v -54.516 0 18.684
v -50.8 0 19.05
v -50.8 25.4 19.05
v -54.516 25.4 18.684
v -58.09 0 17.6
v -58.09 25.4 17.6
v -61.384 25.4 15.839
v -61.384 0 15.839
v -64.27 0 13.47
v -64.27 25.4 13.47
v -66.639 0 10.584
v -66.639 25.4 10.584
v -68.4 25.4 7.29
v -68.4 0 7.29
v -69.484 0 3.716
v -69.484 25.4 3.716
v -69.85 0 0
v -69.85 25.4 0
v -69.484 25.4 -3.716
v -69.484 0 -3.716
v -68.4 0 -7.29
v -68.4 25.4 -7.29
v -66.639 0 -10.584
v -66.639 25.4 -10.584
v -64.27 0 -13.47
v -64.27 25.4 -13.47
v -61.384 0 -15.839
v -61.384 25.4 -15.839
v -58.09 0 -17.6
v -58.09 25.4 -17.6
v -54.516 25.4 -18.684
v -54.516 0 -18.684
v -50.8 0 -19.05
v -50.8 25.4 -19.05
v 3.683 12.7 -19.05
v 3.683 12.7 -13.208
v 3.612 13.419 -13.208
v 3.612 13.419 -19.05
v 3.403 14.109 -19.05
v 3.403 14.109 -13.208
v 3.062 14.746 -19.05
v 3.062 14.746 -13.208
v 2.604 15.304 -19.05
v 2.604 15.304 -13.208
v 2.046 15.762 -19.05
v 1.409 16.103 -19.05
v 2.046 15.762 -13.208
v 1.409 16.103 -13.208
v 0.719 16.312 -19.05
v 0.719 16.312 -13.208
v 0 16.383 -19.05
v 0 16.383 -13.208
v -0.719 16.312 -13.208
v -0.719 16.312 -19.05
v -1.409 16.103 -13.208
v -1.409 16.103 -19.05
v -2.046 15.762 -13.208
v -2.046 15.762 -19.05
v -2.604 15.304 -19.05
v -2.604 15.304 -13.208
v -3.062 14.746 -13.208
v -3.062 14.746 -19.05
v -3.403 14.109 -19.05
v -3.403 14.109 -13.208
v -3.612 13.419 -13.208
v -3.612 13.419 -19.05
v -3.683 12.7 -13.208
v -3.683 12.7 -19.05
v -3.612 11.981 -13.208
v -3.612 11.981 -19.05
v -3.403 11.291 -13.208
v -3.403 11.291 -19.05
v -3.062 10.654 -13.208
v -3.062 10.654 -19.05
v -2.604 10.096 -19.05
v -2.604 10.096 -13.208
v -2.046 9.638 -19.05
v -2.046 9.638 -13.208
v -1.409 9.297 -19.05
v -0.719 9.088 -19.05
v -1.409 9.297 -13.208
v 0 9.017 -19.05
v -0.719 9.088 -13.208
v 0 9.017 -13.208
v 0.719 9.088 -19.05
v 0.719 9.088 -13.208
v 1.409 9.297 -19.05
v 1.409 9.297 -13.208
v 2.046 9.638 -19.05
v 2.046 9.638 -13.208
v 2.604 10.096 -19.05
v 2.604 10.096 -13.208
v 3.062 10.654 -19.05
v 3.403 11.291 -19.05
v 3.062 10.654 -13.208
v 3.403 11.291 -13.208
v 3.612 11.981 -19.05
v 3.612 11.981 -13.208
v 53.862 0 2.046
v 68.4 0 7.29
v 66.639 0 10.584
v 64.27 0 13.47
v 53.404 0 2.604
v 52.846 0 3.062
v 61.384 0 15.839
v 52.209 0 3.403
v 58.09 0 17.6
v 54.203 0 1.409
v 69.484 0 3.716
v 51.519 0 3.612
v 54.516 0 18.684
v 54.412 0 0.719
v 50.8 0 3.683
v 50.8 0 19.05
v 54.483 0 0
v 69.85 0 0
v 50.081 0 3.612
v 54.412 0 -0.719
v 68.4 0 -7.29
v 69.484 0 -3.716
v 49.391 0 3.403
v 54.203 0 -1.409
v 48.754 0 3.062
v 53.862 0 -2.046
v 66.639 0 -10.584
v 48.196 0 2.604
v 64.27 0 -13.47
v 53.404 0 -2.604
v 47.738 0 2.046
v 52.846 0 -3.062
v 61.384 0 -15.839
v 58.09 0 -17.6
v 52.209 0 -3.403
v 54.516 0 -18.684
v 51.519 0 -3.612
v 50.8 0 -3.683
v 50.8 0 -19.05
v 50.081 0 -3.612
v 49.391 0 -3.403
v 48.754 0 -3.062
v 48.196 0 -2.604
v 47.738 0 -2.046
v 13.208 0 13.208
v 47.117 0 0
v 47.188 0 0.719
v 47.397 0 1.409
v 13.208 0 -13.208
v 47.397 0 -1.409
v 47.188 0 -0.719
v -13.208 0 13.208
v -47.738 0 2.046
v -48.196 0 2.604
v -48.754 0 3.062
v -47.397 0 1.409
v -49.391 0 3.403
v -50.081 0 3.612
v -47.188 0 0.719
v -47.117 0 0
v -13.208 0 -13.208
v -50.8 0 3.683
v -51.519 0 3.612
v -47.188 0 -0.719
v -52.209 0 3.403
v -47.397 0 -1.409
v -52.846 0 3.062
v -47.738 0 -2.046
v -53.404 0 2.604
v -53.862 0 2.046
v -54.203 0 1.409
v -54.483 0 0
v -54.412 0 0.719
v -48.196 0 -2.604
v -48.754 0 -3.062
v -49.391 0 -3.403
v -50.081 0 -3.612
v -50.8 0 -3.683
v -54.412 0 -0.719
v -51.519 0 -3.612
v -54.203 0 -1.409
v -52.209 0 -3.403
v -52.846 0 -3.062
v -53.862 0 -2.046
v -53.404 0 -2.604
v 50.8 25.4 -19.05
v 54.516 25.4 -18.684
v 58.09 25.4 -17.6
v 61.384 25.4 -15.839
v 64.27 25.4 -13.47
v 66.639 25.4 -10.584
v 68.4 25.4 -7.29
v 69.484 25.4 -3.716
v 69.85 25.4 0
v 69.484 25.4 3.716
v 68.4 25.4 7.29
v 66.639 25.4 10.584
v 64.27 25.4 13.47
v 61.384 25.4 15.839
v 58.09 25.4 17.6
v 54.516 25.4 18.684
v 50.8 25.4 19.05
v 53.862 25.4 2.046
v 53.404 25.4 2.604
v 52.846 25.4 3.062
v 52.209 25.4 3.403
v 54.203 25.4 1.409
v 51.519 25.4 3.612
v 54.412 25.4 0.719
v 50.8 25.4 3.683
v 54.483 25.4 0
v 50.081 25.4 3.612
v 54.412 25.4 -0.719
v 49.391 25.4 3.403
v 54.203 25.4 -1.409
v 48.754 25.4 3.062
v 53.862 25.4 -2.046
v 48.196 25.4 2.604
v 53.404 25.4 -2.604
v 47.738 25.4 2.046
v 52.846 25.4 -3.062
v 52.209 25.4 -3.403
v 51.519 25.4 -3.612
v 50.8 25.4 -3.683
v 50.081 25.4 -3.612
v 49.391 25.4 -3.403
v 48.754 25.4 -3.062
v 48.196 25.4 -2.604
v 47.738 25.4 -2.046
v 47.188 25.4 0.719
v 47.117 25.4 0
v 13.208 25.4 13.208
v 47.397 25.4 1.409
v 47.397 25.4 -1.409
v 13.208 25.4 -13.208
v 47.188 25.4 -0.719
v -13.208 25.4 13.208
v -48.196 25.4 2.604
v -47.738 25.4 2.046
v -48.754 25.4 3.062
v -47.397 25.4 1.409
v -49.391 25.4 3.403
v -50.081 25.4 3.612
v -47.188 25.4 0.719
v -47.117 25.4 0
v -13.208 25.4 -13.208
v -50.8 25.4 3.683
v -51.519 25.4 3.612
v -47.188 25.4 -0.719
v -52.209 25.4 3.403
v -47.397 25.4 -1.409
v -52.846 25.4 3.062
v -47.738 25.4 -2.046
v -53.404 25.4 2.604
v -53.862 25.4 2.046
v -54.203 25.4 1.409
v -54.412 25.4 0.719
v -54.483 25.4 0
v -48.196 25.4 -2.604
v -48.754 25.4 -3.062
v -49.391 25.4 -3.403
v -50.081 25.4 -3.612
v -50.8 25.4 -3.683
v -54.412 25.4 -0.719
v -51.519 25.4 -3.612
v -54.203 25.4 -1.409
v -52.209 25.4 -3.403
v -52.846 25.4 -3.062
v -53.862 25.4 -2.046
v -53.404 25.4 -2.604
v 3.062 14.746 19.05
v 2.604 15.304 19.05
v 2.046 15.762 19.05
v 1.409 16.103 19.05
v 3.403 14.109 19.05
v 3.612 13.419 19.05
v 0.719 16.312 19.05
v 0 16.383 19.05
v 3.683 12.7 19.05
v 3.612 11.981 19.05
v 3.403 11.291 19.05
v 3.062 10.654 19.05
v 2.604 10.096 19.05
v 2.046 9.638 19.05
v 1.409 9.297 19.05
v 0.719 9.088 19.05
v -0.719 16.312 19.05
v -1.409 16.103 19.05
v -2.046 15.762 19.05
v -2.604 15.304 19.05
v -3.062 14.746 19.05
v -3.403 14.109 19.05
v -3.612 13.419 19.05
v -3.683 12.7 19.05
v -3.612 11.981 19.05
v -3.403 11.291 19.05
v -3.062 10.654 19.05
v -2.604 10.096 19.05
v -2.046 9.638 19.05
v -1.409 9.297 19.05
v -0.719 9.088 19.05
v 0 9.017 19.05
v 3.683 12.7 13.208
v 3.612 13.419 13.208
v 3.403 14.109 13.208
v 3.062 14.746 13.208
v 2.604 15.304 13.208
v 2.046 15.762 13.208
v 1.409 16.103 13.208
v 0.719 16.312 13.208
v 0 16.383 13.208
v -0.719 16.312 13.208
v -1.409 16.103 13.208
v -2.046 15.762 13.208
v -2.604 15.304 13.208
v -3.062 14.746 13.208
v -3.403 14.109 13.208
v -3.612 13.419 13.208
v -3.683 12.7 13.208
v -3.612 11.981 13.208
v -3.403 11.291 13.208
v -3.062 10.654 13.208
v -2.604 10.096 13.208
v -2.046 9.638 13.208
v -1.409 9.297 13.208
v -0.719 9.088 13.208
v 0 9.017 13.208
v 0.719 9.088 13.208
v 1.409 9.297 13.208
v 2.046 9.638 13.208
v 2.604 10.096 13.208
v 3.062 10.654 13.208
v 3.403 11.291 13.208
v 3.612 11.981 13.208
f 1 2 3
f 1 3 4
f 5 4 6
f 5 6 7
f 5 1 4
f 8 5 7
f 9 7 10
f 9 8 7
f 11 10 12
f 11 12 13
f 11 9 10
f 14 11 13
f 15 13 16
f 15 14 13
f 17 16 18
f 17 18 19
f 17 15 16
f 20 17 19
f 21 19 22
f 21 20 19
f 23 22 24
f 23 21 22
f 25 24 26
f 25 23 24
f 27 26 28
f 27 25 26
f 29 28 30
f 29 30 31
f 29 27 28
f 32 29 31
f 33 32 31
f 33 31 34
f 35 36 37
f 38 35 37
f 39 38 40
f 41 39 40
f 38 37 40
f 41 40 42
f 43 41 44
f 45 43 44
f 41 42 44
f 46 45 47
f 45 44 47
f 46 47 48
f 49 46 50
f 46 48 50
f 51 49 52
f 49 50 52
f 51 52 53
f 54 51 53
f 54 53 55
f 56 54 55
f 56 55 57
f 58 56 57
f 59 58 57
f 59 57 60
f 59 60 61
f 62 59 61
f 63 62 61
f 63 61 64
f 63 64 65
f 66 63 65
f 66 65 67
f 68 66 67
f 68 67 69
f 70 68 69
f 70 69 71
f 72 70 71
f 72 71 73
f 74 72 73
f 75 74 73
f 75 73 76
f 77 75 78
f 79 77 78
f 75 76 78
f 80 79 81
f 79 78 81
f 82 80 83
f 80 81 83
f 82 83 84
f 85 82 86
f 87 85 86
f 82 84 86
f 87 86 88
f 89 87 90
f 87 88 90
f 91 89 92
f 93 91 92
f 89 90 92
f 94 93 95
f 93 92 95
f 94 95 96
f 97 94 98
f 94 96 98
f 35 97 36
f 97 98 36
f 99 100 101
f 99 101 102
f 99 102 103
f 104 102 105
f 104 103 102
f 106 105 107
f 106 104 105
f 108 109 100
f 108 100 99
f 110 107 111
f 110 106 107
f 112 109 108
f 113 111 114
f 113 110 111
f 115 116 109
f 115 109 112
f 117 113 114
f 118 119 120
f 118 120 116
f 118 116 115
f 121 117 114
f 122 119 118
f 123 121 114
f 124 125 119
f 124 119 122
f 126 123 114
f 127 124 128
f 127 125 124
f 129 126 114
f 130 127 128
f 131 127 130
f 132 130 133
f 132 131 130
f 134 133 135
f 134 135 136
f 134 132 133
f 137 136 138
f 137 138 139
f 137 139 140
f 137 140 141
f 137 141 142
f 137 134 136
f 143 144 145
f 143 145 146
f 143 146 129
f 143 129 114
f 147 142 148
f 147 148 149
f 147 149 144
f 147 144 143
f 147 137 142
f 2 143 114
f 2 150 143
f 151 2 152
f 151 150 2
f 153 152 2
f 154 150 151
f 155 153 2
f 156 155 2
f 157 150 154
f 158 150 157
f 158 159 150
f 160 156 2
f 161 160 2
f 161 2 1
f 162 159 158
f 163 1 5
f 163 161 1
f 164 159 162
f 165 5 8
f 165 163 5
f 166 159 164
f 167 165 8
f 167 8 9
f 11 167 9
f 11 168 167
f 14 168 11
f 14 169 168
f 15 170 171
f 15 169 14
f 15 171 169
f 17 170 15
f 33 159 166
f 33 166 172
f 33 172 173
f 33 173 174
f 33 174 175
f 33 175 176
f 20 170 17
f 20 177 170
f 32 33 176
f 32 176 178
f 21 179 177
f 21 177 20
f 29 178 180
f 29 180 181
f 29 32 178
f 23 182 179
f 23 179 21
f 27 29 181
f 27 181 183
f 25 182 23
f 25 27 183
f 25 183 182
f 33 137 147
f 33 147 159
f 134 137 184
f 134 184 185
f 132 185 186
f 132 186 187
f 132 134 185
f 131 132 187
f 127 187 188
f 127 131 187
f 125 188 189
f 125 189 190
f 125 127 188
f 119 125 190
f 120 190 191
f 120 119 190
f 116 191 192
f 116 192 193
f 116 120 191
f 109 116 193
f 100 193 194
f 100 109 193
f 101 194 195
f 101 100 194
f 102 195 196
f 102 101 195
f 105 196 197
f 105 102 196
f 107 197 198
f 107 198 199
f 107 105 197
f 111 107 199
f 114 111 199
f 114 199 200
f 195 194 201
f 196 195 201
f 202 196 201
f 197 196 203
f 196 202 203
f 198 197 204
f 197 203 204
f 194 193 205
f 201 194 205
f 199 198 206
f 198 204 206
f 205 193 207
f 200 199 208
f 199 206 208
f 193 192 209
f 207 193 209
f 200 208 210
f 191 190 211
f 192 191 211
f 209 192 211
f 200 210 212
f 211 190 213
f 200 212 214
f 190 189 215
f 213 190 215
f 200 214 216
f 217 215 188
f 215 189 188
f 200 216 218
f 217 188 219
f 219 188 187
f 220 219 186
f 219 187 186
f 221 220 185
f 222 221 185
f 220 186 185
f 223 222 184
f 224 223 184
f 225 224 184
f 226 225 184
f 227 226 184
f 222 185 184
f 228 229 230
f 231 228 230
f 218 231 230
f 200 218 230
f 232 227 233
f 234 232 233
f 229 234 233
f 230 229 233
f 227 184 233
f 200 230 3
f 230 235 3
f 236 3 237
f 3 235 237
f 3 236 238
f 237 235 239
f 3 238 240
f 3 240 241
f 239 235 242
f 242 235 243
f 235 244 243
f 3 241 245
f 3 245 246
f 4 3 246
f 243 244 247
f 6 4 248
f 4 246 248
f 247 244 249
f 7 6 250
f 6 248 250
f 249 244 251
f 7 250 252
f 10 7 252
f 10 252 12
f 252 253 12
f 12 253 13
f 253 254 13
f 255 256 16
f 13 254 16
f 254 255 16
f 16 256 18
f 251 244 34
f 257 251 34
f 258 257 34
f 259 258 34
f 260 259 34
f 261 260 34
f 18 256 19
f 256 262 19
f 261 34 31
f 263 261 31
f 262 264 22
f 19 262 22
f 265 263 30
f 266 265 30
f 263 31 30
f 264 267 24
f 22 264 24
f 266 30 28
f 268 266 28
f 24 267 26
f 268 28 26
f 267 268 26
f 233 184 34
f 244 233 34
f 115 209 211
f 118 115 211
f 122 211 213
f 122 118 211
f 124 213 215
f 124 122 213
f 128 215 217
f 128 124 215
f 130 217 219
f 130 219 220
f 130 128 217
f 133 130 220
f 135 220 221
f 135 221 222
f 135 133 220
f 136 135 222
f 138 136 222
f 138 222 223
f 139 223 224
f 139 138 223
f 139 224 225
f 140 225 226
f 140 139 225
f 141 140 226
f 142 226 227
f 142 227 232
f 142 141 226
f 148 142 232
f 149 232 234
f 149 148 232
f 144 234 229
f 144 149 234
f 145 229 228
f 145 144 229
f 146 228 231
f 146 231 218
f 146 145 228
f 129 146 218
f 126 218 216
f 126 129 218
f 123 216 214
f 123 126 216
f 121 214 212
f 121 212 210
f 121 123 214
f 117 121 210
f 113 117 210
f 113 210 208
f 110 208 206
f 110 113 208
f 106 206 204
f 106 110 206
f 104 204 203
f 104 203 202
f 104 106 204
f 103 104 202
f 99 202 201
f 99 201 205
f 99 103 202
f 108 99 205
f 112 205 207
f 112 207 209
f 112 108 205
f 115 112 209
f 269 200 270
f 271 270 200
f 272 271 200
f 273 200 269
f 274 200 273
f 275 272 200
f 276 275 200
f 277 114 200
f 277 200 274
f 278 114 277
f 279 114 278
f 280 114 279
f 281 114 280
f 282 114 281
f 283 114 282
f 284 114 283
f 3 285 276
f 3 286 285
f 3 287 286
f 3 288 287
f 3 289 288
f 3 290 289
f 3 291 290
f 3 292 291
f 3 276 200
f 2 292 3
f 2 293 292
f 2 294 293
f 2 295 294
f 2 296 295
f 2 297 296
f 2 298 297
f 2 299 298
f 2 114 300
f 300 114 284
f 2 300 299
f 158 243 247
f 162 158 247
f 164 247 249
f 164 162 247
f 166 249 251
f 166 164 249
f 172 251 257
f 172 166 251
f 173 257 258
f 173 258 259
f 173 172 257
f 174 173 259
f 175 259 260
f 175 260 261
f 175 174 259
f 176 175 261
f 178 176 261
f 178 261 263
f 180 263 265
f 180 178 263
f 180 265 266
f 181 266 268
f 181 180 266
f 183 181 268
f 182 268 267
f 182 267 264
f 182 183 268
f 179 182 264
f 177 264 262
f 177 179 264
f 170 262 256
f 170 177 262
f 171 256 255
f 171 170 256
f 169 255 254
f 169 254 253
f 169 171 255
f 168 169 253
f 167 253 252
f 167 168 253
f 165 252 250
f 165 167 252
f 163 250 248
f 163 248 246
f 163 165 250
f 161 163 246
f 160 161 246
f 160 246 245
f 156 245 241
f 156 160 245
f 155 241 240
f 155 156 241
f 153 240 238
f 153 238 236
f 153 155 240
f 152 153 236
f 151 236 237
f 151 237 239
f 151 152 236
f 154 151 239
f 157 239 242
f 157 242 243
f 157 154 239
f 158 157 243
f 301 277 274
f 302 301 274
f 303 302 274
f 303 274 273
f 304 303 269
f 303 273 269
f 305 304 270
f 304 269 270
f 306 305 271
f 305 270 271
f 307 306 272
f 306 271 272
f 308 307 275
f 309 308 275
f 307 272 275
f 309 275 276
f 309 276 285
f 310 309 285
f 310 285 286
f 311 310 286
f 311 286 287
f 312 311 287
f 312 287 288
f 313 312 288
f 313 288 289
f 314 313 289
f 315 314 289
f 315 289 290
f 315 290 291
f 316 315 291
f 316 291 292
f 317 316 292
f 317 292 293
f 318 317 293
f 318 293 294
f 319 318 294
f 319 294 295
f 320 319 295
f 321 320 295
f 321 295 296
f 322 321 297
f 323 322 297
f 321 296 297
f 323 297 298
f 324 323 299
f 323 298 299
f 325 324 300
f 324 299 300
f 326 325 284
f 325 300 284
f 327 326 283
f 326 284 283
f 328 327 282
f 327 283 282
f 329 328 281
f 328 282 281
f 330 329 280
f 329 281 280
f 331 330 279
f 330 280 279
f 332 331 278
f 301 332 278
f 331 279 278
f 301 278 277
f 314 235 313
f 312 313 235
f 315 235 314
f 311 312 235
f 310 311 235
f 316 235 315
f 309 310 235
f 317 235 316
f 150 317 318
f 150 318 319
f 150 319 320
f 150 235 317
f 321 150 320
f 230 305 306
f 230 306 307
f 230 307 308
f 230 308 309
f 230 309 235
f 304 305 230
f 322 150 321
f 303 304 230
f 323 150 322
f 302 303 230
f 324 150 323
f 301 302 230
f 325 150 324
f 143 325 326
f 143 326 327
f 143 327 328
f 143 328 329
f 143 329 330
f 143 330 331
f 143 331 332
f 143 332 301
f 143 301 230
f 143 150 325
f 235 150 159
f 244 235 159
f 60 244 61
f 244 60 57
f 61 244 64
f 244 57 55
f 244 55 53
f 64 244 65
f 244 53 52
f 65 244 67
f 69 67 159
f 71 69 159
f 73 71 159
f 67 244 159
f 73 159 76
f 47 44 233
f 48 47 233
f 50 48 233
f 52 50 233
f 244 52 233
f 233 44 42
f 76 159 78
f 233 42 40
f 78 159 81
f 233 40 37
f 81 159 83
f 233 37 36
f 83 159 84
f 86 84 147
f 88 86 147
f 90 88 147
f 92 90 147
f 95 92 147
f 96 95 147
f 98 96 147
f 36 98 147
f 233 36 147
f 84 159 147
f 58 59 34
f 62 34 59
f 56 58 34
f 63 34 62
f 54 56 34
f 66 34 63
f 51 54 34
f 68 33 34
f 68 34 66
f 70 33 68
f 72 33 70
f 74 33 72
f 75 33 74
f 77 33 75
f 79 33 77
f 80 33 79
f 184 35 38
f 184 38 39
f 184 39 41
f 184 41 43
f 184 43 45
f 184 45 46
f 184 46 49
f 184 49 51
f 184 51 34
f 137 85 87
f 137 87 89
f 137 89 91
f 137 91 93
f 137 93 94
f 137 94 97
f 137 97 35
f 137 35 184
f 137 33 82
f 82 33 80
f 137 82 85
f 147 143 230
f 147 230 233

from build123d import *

# Parameters (mm, degrees)
SKETCH1_R           = 3.683
SKETCH1_W           = 26.416
SKETCH1_H           = 26.416
BOSS_EXTRUDE1_DEPTH = 25.4
SKETCH2_R           = 3.683
CUT_EXTRUDE1_DEPTH  = 39.1


with BuildPart() as part:
    # Sketch1 → Boss-Extrude1 (new body)
    with BuildSketch(Plane(origin=(0, 0, 0), x_dir=(1, 0, 0), z_dir=(0, 1, 0))):
        with BuildLine():
            Line((-50.8, 19.05), (50.8, 19.05))
            ThreePointArc((50.8, 19.05), (69.85, 0), (50.8, -19.05))
            Line((50.8, -19.05), (-50.8, -19.05))
            ThreePointArc((-50.8, -19.05), (-69.85, 0), (-50.8, 19.05))
        make_face()
        with Locations((-50.8, 0)):
            Circle(SKETCH1_R, mode=Mode.SUBTRACT)
        with Locations((50.8, 0)):
            Circle(SKETCH1_R, mode=Mode.SUBTRACT)
        Rectangle(SKETCH1_W, SKETCH1_H, mode=Mode.SUBTRACT)
    extrude(amount=BOSS_EXTRUDE1_DEPTH)

    # Sketch2 → Cut-Extrude1 (cut, through all)
    with BuildSketch(Plane.XY.offset(19.05)):
        with Locations((0, 12.7)):
            Circle(SKETCH2_R)
    extrude(amount=-CUT_EXTRUDE1_DEPTH, mode=Mode.SUBTRACT)


solid = part.part
